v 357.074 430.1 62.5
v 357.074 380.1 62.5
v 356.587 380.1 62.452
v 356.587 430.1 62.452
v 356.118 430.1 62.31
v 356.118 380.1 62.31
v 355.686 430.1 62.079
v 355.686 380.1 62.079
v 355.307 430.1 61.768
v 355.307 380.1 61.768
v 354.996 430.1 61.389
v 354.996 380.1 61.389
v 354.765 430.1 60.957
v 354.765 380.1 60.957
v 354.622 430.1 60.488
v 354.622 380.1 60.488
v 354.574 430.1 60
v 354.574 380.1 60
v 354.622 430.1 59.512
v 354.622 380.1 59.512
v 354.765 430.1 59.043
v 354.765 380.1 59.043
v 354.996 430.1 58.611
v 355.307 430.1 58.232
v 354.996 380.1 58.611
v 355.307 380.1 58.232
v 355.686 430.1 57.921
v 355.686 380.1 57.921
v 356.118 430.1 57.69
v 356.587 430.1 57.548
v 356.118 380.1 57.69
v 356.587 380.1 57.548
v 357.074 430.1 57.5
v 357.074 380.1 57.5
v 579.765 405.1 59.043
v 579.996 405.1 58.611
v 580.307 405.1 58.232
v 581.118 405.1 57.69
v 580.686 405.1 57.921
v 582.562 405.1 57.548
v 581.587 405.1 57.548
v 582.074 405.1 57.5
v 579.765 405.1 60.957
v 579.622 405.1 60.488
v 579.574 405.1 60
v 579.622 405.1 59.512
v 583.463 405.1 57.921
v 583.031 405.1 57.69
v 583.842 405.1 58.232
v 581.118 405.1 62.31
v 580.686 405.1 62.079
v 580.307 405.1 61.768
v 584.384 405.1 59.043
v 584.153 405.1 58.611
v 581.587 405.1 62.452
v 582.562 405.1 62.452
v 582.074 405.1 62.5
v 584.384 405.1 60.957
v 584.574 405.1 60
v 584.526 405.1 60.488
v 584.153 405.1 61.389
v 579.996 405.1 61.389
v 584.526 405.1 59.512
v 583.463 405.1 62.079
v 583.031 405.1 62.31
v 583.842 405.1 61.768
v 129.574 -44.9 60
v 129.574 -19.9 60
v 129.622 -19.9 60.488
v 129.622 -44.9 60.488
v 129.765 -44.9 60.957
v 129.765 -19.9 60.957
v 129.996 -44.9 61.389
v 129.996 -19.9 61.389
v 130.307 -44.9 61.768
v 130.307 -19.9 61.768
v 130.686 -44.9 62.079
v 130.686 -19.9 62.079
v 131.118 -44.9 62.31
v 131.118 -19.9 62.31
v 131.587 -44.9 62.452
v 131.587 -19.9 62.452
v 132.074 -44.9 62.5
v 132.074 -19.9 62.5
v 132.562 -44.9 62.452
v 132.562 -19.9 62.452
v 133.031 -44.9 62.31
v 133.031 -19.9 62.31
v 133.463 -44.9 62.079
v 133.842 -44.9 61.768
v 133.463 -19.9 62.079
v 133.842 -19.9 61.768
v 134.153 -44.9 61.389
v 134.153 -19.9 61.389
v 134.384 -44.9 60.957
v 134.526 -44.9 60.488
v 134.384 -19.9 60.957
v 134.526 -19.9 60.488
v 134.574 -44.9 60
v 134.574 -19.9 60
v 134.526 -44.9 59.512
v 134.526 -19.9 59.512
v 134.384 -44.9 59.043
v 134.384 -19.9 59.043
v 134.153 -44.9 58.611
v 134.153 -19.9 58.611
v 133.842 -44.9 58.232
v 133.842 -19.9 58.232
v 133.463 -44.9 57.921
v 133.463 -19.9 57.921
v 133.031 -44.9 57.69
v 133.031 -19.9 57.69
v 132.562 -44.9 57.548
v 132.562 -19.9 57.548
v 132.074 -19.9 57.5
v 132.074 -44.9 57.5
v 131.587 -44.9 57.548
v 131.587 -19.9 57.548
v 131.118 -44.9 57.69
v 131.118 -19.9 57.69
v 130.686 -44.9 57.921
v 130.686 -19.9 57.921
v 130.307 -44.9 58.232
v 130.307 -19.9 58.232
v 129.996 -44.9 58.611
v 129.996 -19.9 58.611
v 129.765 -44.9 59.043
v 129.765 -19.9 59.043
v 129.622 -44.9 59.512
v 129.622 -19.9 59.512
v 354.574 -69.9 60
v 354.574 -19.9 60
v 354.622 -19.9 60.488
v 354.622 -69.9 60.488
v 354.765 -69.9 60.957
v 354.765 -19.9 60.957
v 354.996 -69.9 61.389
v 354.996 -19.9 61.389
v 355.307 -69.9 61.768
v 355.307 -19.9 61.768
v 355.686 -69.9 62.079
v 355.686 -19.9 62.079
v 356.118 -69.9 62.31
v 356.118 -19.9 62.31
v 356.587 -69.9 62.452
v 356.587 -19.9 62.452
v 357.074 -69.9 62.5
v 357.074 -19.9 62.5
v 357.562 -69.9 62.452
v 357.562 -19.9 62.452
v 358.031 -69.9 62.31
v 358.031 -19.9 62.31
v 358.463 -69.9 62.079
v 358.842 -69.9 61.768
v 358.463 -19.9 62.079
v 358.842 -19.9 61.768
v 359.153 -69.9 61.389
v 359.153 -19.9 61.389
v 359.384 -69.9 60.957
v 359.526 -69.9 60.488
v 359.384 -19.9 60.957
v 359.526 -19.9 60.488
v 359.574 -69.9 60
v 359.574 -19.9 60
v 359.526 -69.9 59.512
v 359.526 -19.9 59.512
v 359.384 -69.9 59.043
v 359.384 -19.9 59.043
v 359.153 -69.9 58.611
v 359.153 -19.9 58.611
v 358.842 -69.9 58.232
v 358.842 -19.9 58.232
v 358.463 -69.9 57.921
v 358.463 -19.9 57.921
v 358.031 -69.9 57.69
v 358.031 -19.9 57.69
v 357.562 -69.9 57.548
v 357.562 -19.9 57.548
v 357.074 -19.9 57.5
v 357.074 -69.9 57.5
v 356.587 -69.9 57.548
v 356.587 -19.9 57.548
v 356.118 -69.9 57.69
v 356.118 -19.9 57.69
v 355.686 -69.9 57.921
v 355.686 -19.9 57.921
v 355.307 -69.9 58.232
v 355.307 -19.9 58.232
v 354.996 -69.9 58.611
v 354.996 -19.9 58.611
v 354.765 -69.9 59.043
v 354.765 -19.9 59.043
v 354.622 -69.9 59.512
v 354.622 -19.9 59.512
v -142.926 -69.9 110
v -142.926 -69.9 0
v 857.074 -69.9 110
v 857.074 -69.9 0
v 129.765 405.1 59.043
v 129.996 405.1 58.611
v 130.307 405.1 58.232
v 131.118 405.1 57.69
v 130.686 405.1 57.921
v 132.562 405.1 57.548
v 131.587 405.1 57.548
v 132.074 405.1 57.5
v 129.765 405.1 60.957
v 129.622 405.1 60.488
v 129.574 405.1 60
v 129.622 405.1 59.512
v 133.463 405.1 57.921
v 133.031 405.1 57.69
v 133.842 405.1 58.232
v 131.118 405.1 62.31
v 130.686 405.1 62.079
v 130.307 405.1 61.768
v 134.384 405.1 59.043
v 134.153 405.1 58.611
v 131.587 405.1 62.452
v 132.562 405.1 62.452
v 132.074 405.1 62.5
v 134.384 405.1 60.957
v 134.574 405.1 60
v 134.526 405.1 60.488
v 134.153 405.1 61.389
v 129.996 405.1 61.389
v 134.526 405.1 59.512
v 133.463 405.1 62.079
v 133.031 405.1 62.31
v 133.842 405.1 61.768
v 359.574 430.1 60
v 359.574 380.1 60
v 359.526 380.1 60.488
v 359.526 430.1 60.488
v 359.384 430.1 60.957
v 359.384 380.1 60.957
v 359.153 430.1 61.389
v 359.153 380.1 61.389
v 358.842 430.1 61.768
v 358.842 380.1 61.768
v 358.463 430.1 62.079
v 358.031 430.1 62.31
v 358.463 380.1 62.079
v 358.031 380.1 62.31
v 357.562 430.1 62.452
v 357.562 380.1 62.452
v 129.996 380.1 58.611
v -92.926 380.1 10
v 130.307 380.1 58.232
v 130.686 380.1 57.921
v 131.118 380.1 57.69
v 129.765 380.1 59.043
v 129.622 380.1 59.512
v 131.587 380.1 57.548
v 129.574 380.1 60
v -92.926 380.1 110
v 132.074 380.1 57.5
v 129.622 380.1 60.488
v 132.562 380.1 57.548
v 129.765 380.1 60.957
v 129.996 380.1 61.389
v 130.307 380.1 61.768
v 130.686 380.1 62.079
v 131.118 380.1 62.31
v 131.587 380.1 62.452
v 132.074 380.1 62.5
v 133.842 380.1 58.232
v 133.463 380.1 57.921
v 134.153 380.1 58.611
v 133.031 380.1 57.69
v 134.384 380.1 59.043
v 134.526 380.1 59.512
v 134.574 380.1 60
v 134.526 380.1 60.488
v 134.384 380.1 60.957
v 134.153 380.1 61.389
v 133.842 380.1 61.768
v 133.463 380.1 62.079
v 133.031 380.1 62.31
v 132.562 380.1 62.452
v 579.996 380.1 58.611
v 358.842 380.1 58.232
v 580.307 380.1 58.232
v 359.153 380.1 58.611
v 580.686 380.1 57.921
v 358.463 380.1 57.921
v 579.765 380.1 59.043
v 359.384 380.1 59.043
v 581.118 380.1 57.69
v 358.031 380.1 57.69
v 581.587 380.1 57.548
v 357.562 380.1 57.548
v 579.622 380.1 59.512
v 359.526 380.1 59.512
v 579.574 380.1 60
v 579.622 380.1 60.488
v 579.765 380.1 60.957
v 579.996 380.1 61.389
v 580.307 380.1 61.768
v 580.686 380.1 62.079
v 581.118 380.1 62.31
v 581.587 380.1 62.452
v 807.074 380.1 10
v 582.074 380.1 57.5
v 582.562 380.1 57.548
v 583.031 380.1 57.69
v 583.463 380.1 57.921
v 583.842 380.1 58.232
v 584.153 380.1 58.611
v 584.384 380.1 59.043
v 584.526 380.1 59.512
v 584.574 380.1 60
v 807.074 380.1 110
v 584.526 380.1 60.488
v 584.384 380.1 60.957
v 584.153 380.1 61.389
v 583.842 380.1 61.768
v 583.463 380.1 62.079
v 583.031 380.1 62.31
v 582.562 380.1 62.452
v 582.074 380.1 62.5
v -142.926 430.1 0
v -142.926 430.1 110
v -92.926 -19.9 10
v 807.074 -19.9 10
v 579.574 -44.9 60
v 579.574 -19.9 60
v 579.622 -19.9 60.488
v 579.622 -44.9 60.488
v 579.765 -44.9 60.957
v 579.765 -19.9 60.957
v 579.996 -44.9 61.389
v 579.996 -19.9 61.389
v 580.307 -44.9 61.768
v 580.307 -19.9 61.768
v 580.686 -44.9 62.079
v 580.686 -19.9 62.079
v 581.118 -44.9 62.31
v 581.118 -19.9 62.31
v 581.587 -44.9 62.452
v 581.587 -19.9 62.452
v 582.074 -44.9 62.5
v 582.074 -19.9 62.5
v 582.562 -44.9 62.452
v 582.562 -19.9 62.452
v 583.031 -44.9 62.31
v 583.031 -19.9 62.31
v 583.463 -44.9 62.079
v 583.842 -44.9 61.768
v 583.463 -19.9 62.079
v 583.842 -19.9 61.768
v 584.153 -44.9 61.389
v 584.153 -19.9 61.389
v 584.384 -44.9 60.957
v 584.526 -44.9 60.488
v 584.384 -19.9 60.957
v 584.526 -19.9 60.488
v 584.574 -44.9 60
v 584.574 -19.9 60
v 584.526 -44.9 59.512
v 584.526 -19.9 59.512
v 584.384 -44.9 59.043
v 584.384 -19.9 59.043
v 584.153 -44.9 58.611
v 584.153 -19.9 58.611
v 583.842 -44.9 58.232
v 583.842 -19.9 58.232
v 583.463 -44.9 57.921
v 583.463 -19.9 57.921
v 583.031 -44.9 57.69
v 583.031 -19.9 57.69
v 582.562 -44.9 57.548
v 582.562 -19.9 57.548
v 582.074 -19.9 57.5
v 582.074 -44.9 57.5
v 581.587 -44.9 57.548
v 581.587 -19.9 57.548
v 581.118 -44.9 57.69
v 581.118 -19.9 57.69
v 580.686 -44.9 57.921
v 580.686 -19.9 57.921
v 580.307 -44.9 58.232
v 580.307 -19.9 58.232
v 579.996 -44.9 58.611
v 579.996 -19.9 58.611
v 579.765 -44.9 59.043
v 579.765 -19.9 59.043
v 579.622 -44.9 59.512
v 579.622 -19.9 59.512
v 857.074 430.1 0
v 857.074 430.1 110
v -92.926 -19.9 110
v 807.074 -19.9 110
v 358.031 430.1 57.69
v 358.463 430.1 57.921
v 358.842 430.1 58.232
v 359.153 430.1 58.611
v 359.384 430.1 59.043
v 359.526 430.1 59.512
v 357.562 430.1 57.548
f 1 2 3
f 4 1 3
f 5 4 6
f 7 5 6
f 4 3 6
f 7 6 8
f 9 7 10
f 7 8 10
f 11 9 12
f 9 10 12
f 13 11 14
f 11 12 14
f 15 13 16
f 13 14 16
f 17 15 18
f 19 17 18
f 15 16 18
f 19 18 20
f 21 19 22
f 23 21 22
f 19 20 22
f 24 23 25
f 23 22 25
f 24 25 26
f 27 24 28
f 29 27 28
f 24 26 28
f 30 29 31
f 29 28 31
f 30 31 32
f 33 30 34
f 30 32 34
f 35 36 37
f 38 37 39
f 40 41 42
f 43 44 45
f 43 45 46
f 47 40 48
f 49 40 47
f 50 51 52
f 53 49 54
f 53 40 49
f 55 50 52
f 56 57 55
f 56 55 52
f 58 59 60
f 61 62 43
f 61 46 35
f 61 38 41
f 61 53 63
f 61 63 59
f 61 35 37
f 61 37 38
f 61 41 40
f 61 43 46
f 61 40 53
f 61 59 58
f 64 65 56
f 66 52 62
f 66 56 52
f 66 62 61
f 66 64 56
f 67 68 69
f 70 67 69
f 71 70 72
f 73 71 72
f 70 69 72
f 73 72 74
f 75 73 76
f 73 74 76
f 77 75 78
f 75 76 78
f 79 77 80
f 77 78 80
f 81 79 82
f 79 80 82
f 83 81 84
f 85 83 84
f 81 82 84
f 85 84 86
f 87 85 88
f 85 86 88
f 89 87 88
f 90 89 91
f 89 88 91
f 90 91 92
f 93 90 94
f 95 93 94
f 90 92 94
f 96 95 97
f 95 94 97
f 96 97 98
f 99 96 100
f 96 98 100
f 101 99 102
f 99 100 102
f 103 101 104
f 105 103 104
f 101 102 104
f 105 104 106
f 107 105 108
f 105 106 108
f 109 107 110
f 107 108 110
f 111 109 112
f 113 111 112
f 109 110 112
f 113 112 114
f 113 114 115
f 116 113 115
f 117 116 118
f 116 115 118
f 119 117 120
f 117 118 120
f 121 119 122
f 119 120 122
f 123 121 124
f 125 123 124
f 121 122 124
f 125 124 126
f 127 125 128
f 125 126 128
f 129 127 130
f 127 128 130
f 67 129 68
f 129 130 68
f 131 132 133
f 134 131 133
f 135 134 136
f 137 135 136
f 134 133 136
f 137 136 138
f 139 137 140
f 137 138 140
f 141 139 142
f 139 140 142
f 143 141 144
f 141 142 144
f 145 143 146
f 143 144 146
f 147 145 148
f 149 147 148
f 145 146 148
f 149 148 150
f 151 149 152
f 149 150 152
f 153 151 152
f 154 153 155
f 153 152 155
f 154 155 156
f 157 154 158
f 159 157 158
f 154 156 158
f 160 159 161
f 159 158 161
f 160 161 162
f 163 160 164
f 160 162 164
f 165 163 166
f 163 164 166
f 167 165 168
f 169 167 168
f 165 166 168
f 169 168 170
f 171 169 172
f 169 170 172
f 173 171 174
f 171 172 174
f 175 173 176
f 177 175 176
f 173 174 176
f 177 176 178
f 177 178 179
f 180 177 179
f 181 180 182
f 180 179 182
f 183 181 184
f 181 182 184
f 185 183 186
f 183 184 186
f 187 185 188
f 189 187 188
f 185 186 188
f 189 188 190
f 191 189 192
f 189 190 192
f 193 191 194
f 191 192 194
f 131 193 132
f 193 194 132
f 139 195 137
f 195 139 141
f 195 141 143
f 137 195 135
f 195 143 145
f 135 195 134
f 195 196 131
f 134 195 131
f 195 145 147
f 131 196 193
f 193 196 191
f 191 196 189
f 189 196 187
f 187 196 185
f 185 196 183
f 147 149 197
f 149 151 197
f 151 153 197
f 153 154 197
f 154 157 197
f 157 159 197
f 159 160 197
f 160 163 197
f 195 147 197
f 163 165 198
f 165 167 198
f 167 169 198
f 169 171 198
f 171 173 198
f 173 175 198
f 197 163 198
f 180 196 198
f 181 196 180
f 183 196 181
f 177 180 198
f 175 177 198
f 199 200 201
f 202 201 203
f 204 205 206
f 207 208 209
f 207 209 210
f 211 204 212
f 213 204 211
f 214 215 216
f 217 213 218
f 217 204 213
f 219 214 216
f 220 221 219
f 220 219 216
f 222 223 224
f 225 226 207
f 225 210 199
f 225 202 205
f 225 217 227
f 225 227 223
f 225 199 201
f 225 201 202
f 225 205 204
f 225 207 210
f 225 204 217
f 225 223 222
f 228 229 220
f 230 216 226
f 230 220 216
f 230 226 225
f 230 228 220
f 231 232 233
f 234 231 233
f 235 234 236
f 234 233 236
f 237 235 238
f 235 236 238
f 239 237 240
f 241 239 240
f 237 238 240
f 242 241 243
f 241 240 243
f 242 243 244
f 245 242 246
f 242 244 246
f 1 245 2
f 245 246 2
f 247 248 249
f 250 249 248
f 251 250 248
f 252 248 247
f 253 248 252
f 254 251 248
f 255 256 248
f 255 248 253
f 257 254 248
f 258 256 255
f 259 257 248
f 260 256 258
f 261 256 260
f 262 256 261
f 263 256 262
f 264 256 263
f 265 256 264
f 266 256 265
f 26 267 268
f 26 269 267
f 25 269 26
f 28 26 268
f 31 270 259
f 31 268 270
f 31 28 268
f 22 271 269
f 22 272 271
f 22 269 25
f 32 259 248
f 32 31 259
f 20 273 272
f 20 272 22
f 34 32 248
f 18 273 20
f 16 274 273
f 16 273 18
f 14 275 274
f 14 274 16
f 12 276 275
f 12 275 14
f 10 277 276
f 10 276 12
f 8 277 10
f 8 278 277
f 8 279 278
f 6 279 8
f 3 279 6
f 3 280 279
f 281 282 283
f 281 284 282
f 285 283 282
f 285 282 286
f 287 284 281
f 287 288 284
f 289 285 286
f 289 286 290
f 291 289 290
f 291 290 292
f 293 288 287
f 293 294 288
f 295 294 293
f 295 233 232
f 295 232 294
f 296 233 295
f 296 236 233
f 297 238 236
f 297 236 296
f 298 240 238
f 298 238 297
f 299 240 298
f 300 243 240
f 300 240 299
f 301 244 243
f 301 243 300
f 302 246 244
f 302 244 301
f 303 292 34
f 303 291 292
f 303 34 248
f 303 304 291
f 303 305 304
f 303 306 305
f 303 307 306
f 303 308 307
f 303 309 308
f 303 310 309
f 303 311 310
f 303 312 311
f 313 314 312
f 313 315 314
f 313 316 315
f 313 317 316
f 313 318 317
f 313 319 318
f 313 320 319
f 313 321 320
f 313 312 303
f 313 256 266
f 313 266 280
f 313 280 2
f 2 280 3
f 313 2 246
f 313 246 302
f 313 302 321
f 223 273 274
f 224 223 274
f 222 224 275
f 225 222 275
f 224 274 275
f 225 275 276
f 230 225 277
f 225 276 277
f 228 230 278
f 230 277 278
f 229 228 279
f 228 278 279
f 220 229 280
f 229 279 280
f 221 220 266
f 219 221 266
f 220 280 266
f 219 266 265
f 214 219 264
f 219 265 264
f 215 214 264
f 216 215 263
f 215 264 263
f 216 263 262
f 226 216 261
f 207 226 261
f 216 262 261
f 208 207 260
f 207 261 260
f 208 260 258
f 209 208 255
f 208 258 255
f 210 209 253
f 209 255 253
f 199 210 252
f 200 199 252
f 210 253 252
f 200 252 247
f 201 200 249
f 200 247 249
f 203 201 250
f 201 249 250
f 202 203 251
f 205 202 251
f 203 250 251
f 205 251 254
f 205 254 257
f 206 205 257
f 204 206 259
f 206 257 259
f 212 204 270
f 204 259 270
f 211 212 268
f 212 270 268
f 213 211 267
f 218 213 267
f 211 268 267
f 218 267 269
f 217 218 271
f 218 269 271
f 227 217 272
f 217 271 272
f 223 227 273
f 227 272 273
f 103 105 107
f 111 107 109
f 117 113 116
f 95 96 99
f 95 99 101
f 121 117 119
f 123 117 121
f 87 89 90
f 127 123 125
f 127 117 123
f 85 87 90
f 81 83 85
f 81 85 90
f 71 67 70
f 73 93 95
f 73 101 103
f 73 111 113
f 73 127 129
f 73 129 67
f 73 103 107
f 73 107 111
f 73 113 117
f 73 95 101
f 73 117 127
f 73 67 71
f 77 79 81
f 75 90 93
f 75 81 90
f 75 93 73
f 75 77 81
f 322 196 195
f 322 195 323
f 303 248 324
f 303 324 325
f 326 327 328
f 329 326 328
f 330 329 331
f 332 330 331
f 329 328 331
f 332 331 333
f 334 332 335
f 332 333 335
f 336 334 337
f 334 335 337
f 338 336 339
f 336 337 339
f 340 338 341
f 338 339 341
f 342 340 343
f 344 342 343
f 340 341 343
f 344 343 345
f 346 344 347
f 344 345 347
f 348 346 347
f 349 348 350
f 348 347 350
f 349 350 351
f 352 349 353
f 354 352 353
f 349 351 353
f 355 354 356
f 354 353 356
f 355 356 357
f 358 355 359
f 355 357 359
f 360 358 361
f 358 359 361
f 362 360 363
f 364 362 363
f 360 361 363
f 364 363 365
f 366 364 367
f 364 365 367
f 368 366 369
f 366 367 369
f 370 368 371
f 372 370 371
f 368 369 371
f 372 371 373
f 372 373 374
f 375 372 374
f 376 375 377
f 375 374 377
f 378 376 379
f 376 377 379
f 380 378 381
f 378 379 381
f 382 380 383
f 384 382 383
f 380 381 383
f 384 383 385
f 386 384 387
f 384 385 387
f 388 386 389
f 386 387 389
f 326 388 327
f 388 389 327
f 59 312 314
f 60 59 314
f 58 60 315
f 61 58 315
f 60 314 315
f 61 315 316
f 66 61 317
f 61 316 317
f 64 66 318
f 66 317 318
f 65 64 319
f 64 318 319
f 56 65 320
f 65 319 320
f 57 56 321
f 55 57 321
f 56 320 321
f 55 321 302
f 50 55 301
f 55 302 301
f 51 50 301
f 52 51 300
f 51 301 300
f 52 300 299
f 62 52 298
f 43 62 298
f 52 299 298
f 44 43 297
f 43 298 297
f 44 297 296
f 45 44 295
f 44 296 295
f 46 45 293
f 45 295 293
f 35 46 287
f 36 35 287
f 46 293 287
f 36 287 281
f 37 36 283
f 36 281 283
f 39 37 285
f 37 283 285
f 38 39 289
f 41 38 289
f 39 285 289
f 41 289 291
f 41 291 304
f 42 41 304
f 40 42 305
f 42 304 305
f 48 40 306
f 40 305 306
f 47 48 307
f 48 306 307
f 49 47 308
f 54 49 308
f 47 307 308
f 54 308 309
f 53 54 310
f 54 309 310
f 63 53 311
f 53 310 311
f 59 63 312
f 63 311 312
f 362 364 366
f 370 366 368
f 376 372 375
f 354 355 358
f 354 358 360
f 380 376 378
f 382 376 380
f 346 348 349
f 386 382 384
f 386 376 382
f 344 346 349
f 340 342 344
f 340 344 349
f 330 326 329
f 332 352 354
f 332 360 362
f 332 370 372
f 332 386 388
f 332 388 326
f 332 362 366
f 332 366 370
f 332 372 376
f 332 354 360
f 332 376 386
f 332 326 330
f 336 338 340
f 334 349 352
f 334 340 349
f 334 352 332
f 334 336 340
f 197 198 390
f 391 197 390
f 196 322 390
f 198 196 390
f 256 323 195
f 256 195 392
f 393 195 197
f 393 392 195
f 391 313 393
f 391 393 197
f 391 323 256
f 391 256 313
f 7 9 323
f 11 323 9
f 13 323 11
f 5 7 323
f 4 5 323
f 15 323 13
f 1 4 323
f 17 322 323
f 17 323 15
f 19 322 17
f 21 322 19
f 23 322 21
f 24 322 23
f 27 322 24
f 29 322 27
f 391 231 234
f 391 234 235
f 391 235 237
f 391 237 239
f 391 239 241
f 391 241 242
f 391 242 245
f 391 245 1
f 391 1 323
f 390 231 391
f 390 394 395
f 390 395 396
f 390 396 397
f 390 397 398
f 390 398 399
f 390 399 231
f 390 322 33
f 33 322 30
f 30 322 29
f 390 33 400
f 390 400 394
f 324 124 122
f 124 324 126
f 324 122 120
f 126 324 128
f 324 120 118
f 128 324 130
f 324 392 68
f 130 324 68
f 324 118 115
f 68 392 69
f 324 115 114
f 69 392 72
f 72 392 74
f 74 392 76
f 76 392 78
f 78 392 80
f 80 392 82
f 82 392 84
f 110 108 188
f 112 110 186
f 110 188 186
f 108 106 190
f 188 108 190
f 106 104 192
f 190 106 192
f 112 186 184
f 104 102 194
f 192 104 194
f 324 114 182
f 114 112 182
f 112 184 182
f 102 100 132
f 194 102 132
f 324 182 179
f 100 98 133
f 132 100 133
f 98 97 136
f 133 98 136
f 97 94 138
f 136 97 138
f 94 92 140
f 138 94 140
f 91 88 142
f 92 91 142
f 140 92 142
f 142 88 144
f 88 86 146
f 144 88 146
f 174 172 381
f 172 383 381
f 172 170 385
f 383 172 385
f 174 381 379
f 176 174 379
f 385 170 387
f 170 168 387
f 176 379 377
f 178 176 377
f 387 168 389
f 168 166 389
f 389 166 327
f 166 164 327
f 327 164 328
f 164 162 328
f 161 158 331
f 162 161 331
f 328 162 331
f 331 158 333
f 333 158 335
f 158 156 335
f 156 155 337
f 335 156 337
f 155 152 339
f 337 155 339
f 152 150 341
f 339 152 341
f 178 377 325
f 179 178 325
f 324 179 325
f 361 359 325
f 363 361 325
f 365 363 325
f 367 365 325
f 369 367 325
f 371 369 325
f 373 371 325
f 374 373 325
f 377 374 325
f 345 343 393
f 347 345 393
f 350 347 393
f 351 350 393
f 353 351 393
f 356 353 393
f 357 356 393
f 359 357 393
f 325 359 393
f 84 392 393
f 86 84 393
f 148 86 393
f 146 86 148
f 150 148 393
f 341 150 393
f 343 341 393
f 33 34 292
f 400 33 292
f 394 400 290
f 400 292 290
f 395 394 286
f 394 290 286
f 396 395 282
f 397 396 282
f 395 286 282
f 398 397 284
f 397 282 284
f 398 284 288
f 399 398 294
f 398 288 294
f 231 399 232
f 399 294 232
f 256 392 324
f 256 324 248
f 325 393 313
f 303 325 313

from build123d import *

# Parameters (mm, degrees)
F0_W      = 1000
F0_H      = 500
F1_DEPTH  = 110
F2_W      = 900
F2_H      = 400
F3_DEPTH  = 100
F5_DEPTH  = 50
F6_R      = 2.5
F7_DEPTH  = 50
F8_R      = 2.5
F9_DEPTH  = 25
F10_DEPTH = 25
F11_R     = 2.5
F12_DEPTH = 25


with BuildPart() as f1:
    # F0 (on Top) → F1 (new body)
    with BuildSketch(Plane.XY):
        with Locations((357.0744521916, 180.0998109607)):
            Rectangle(F0_W, F0_H)
    extrude(amount=F1_DEPTH)

    # F2 (on face) → F3 (cut)
    with BuildSketch(Plane.XY.offset(110)):
        with Locations((357.0744521916, 180.0998109607)):
            Rectangle(F2_W, F2_H)
    extrude(amount=-F3_DEPTH, mode=Mode.SUBTRACT)

    # F4 (on face) → F5 (cut)
    with BuildSketch(Plane.XZ.offset(-380.0998109607)):
        with BuildLine():
            ThreePointArc((359.5744521916, 60), (358.8422191446, 61.767766953), (357.0744521916, 62.5))
            Line((357.0744521916, 62.5), (357.0744521916, 57.5))
            ThreePointArc((357.0744521916, 57.5), (358.8422191446, 58.232233047), (359.5744521916, 60))
        make_face()
        with BuildLine():
            Line((357.0744521916, 57.5), (357.0744521916, 62.5))
            ThreePointArc((357.0744521916, 62.5), (354.5744521916, 60), (357.0744521916, 57.5))
        make_face()
    extrude(amount=-F5_DEPTH, mode=Mode.SUBTRACT)

    # F6 (on face) → F7 (cut)
    with BuildSketch(Plane(origin=(0, -19.9001890393, 0), x_dir=(-1, 0, 0), z_dir=(0, 1, 0))):
        with Locations((-357.0744521916, 60)):
            Circle(F6_R)
    extrude(amount=-F7_DEPTH, mode=Mode.SUBTRACT)

    # F8 (on face) → F9 (cut)
    with BuildSketch(Plane.XZ.offset(-380.0998109607)):
        with Locations((132.0744521916, 60)):
            Circle(F8_R)
    extrude(amount=-F9_DEPTH, mode=Mode.SUBTRACT)

    # F8 (on face) → F10 (cut)
    with BuildSketch(Plane.XZ.offset(-380.0998109607)):
        with Locations((132.0744521916, 60)):
            Circle(F8_R)
        with Locations((582.0744521916, 60)):
            Circle(F8_R)
    extrude(amount=-F10_DEPTH, mode=Mode.SUBTRACT)

    # F11 (on face) → F12 (cut)
    with BuildSketch(Plane(origin=(0, -19.9001890393, 0), x_dir=(-1, 0, 0), z_dir=(0, 1, 0))):
        with Locations((-132.0744521916, 60)):
            Circle(F11_R)
        with Locations((-582.0744521916, 60)):
            Circle(F11_R)
    extrude(amount=-F12_DEPTH, mode=Mode.SUBTRACT)


solid = f1.part
